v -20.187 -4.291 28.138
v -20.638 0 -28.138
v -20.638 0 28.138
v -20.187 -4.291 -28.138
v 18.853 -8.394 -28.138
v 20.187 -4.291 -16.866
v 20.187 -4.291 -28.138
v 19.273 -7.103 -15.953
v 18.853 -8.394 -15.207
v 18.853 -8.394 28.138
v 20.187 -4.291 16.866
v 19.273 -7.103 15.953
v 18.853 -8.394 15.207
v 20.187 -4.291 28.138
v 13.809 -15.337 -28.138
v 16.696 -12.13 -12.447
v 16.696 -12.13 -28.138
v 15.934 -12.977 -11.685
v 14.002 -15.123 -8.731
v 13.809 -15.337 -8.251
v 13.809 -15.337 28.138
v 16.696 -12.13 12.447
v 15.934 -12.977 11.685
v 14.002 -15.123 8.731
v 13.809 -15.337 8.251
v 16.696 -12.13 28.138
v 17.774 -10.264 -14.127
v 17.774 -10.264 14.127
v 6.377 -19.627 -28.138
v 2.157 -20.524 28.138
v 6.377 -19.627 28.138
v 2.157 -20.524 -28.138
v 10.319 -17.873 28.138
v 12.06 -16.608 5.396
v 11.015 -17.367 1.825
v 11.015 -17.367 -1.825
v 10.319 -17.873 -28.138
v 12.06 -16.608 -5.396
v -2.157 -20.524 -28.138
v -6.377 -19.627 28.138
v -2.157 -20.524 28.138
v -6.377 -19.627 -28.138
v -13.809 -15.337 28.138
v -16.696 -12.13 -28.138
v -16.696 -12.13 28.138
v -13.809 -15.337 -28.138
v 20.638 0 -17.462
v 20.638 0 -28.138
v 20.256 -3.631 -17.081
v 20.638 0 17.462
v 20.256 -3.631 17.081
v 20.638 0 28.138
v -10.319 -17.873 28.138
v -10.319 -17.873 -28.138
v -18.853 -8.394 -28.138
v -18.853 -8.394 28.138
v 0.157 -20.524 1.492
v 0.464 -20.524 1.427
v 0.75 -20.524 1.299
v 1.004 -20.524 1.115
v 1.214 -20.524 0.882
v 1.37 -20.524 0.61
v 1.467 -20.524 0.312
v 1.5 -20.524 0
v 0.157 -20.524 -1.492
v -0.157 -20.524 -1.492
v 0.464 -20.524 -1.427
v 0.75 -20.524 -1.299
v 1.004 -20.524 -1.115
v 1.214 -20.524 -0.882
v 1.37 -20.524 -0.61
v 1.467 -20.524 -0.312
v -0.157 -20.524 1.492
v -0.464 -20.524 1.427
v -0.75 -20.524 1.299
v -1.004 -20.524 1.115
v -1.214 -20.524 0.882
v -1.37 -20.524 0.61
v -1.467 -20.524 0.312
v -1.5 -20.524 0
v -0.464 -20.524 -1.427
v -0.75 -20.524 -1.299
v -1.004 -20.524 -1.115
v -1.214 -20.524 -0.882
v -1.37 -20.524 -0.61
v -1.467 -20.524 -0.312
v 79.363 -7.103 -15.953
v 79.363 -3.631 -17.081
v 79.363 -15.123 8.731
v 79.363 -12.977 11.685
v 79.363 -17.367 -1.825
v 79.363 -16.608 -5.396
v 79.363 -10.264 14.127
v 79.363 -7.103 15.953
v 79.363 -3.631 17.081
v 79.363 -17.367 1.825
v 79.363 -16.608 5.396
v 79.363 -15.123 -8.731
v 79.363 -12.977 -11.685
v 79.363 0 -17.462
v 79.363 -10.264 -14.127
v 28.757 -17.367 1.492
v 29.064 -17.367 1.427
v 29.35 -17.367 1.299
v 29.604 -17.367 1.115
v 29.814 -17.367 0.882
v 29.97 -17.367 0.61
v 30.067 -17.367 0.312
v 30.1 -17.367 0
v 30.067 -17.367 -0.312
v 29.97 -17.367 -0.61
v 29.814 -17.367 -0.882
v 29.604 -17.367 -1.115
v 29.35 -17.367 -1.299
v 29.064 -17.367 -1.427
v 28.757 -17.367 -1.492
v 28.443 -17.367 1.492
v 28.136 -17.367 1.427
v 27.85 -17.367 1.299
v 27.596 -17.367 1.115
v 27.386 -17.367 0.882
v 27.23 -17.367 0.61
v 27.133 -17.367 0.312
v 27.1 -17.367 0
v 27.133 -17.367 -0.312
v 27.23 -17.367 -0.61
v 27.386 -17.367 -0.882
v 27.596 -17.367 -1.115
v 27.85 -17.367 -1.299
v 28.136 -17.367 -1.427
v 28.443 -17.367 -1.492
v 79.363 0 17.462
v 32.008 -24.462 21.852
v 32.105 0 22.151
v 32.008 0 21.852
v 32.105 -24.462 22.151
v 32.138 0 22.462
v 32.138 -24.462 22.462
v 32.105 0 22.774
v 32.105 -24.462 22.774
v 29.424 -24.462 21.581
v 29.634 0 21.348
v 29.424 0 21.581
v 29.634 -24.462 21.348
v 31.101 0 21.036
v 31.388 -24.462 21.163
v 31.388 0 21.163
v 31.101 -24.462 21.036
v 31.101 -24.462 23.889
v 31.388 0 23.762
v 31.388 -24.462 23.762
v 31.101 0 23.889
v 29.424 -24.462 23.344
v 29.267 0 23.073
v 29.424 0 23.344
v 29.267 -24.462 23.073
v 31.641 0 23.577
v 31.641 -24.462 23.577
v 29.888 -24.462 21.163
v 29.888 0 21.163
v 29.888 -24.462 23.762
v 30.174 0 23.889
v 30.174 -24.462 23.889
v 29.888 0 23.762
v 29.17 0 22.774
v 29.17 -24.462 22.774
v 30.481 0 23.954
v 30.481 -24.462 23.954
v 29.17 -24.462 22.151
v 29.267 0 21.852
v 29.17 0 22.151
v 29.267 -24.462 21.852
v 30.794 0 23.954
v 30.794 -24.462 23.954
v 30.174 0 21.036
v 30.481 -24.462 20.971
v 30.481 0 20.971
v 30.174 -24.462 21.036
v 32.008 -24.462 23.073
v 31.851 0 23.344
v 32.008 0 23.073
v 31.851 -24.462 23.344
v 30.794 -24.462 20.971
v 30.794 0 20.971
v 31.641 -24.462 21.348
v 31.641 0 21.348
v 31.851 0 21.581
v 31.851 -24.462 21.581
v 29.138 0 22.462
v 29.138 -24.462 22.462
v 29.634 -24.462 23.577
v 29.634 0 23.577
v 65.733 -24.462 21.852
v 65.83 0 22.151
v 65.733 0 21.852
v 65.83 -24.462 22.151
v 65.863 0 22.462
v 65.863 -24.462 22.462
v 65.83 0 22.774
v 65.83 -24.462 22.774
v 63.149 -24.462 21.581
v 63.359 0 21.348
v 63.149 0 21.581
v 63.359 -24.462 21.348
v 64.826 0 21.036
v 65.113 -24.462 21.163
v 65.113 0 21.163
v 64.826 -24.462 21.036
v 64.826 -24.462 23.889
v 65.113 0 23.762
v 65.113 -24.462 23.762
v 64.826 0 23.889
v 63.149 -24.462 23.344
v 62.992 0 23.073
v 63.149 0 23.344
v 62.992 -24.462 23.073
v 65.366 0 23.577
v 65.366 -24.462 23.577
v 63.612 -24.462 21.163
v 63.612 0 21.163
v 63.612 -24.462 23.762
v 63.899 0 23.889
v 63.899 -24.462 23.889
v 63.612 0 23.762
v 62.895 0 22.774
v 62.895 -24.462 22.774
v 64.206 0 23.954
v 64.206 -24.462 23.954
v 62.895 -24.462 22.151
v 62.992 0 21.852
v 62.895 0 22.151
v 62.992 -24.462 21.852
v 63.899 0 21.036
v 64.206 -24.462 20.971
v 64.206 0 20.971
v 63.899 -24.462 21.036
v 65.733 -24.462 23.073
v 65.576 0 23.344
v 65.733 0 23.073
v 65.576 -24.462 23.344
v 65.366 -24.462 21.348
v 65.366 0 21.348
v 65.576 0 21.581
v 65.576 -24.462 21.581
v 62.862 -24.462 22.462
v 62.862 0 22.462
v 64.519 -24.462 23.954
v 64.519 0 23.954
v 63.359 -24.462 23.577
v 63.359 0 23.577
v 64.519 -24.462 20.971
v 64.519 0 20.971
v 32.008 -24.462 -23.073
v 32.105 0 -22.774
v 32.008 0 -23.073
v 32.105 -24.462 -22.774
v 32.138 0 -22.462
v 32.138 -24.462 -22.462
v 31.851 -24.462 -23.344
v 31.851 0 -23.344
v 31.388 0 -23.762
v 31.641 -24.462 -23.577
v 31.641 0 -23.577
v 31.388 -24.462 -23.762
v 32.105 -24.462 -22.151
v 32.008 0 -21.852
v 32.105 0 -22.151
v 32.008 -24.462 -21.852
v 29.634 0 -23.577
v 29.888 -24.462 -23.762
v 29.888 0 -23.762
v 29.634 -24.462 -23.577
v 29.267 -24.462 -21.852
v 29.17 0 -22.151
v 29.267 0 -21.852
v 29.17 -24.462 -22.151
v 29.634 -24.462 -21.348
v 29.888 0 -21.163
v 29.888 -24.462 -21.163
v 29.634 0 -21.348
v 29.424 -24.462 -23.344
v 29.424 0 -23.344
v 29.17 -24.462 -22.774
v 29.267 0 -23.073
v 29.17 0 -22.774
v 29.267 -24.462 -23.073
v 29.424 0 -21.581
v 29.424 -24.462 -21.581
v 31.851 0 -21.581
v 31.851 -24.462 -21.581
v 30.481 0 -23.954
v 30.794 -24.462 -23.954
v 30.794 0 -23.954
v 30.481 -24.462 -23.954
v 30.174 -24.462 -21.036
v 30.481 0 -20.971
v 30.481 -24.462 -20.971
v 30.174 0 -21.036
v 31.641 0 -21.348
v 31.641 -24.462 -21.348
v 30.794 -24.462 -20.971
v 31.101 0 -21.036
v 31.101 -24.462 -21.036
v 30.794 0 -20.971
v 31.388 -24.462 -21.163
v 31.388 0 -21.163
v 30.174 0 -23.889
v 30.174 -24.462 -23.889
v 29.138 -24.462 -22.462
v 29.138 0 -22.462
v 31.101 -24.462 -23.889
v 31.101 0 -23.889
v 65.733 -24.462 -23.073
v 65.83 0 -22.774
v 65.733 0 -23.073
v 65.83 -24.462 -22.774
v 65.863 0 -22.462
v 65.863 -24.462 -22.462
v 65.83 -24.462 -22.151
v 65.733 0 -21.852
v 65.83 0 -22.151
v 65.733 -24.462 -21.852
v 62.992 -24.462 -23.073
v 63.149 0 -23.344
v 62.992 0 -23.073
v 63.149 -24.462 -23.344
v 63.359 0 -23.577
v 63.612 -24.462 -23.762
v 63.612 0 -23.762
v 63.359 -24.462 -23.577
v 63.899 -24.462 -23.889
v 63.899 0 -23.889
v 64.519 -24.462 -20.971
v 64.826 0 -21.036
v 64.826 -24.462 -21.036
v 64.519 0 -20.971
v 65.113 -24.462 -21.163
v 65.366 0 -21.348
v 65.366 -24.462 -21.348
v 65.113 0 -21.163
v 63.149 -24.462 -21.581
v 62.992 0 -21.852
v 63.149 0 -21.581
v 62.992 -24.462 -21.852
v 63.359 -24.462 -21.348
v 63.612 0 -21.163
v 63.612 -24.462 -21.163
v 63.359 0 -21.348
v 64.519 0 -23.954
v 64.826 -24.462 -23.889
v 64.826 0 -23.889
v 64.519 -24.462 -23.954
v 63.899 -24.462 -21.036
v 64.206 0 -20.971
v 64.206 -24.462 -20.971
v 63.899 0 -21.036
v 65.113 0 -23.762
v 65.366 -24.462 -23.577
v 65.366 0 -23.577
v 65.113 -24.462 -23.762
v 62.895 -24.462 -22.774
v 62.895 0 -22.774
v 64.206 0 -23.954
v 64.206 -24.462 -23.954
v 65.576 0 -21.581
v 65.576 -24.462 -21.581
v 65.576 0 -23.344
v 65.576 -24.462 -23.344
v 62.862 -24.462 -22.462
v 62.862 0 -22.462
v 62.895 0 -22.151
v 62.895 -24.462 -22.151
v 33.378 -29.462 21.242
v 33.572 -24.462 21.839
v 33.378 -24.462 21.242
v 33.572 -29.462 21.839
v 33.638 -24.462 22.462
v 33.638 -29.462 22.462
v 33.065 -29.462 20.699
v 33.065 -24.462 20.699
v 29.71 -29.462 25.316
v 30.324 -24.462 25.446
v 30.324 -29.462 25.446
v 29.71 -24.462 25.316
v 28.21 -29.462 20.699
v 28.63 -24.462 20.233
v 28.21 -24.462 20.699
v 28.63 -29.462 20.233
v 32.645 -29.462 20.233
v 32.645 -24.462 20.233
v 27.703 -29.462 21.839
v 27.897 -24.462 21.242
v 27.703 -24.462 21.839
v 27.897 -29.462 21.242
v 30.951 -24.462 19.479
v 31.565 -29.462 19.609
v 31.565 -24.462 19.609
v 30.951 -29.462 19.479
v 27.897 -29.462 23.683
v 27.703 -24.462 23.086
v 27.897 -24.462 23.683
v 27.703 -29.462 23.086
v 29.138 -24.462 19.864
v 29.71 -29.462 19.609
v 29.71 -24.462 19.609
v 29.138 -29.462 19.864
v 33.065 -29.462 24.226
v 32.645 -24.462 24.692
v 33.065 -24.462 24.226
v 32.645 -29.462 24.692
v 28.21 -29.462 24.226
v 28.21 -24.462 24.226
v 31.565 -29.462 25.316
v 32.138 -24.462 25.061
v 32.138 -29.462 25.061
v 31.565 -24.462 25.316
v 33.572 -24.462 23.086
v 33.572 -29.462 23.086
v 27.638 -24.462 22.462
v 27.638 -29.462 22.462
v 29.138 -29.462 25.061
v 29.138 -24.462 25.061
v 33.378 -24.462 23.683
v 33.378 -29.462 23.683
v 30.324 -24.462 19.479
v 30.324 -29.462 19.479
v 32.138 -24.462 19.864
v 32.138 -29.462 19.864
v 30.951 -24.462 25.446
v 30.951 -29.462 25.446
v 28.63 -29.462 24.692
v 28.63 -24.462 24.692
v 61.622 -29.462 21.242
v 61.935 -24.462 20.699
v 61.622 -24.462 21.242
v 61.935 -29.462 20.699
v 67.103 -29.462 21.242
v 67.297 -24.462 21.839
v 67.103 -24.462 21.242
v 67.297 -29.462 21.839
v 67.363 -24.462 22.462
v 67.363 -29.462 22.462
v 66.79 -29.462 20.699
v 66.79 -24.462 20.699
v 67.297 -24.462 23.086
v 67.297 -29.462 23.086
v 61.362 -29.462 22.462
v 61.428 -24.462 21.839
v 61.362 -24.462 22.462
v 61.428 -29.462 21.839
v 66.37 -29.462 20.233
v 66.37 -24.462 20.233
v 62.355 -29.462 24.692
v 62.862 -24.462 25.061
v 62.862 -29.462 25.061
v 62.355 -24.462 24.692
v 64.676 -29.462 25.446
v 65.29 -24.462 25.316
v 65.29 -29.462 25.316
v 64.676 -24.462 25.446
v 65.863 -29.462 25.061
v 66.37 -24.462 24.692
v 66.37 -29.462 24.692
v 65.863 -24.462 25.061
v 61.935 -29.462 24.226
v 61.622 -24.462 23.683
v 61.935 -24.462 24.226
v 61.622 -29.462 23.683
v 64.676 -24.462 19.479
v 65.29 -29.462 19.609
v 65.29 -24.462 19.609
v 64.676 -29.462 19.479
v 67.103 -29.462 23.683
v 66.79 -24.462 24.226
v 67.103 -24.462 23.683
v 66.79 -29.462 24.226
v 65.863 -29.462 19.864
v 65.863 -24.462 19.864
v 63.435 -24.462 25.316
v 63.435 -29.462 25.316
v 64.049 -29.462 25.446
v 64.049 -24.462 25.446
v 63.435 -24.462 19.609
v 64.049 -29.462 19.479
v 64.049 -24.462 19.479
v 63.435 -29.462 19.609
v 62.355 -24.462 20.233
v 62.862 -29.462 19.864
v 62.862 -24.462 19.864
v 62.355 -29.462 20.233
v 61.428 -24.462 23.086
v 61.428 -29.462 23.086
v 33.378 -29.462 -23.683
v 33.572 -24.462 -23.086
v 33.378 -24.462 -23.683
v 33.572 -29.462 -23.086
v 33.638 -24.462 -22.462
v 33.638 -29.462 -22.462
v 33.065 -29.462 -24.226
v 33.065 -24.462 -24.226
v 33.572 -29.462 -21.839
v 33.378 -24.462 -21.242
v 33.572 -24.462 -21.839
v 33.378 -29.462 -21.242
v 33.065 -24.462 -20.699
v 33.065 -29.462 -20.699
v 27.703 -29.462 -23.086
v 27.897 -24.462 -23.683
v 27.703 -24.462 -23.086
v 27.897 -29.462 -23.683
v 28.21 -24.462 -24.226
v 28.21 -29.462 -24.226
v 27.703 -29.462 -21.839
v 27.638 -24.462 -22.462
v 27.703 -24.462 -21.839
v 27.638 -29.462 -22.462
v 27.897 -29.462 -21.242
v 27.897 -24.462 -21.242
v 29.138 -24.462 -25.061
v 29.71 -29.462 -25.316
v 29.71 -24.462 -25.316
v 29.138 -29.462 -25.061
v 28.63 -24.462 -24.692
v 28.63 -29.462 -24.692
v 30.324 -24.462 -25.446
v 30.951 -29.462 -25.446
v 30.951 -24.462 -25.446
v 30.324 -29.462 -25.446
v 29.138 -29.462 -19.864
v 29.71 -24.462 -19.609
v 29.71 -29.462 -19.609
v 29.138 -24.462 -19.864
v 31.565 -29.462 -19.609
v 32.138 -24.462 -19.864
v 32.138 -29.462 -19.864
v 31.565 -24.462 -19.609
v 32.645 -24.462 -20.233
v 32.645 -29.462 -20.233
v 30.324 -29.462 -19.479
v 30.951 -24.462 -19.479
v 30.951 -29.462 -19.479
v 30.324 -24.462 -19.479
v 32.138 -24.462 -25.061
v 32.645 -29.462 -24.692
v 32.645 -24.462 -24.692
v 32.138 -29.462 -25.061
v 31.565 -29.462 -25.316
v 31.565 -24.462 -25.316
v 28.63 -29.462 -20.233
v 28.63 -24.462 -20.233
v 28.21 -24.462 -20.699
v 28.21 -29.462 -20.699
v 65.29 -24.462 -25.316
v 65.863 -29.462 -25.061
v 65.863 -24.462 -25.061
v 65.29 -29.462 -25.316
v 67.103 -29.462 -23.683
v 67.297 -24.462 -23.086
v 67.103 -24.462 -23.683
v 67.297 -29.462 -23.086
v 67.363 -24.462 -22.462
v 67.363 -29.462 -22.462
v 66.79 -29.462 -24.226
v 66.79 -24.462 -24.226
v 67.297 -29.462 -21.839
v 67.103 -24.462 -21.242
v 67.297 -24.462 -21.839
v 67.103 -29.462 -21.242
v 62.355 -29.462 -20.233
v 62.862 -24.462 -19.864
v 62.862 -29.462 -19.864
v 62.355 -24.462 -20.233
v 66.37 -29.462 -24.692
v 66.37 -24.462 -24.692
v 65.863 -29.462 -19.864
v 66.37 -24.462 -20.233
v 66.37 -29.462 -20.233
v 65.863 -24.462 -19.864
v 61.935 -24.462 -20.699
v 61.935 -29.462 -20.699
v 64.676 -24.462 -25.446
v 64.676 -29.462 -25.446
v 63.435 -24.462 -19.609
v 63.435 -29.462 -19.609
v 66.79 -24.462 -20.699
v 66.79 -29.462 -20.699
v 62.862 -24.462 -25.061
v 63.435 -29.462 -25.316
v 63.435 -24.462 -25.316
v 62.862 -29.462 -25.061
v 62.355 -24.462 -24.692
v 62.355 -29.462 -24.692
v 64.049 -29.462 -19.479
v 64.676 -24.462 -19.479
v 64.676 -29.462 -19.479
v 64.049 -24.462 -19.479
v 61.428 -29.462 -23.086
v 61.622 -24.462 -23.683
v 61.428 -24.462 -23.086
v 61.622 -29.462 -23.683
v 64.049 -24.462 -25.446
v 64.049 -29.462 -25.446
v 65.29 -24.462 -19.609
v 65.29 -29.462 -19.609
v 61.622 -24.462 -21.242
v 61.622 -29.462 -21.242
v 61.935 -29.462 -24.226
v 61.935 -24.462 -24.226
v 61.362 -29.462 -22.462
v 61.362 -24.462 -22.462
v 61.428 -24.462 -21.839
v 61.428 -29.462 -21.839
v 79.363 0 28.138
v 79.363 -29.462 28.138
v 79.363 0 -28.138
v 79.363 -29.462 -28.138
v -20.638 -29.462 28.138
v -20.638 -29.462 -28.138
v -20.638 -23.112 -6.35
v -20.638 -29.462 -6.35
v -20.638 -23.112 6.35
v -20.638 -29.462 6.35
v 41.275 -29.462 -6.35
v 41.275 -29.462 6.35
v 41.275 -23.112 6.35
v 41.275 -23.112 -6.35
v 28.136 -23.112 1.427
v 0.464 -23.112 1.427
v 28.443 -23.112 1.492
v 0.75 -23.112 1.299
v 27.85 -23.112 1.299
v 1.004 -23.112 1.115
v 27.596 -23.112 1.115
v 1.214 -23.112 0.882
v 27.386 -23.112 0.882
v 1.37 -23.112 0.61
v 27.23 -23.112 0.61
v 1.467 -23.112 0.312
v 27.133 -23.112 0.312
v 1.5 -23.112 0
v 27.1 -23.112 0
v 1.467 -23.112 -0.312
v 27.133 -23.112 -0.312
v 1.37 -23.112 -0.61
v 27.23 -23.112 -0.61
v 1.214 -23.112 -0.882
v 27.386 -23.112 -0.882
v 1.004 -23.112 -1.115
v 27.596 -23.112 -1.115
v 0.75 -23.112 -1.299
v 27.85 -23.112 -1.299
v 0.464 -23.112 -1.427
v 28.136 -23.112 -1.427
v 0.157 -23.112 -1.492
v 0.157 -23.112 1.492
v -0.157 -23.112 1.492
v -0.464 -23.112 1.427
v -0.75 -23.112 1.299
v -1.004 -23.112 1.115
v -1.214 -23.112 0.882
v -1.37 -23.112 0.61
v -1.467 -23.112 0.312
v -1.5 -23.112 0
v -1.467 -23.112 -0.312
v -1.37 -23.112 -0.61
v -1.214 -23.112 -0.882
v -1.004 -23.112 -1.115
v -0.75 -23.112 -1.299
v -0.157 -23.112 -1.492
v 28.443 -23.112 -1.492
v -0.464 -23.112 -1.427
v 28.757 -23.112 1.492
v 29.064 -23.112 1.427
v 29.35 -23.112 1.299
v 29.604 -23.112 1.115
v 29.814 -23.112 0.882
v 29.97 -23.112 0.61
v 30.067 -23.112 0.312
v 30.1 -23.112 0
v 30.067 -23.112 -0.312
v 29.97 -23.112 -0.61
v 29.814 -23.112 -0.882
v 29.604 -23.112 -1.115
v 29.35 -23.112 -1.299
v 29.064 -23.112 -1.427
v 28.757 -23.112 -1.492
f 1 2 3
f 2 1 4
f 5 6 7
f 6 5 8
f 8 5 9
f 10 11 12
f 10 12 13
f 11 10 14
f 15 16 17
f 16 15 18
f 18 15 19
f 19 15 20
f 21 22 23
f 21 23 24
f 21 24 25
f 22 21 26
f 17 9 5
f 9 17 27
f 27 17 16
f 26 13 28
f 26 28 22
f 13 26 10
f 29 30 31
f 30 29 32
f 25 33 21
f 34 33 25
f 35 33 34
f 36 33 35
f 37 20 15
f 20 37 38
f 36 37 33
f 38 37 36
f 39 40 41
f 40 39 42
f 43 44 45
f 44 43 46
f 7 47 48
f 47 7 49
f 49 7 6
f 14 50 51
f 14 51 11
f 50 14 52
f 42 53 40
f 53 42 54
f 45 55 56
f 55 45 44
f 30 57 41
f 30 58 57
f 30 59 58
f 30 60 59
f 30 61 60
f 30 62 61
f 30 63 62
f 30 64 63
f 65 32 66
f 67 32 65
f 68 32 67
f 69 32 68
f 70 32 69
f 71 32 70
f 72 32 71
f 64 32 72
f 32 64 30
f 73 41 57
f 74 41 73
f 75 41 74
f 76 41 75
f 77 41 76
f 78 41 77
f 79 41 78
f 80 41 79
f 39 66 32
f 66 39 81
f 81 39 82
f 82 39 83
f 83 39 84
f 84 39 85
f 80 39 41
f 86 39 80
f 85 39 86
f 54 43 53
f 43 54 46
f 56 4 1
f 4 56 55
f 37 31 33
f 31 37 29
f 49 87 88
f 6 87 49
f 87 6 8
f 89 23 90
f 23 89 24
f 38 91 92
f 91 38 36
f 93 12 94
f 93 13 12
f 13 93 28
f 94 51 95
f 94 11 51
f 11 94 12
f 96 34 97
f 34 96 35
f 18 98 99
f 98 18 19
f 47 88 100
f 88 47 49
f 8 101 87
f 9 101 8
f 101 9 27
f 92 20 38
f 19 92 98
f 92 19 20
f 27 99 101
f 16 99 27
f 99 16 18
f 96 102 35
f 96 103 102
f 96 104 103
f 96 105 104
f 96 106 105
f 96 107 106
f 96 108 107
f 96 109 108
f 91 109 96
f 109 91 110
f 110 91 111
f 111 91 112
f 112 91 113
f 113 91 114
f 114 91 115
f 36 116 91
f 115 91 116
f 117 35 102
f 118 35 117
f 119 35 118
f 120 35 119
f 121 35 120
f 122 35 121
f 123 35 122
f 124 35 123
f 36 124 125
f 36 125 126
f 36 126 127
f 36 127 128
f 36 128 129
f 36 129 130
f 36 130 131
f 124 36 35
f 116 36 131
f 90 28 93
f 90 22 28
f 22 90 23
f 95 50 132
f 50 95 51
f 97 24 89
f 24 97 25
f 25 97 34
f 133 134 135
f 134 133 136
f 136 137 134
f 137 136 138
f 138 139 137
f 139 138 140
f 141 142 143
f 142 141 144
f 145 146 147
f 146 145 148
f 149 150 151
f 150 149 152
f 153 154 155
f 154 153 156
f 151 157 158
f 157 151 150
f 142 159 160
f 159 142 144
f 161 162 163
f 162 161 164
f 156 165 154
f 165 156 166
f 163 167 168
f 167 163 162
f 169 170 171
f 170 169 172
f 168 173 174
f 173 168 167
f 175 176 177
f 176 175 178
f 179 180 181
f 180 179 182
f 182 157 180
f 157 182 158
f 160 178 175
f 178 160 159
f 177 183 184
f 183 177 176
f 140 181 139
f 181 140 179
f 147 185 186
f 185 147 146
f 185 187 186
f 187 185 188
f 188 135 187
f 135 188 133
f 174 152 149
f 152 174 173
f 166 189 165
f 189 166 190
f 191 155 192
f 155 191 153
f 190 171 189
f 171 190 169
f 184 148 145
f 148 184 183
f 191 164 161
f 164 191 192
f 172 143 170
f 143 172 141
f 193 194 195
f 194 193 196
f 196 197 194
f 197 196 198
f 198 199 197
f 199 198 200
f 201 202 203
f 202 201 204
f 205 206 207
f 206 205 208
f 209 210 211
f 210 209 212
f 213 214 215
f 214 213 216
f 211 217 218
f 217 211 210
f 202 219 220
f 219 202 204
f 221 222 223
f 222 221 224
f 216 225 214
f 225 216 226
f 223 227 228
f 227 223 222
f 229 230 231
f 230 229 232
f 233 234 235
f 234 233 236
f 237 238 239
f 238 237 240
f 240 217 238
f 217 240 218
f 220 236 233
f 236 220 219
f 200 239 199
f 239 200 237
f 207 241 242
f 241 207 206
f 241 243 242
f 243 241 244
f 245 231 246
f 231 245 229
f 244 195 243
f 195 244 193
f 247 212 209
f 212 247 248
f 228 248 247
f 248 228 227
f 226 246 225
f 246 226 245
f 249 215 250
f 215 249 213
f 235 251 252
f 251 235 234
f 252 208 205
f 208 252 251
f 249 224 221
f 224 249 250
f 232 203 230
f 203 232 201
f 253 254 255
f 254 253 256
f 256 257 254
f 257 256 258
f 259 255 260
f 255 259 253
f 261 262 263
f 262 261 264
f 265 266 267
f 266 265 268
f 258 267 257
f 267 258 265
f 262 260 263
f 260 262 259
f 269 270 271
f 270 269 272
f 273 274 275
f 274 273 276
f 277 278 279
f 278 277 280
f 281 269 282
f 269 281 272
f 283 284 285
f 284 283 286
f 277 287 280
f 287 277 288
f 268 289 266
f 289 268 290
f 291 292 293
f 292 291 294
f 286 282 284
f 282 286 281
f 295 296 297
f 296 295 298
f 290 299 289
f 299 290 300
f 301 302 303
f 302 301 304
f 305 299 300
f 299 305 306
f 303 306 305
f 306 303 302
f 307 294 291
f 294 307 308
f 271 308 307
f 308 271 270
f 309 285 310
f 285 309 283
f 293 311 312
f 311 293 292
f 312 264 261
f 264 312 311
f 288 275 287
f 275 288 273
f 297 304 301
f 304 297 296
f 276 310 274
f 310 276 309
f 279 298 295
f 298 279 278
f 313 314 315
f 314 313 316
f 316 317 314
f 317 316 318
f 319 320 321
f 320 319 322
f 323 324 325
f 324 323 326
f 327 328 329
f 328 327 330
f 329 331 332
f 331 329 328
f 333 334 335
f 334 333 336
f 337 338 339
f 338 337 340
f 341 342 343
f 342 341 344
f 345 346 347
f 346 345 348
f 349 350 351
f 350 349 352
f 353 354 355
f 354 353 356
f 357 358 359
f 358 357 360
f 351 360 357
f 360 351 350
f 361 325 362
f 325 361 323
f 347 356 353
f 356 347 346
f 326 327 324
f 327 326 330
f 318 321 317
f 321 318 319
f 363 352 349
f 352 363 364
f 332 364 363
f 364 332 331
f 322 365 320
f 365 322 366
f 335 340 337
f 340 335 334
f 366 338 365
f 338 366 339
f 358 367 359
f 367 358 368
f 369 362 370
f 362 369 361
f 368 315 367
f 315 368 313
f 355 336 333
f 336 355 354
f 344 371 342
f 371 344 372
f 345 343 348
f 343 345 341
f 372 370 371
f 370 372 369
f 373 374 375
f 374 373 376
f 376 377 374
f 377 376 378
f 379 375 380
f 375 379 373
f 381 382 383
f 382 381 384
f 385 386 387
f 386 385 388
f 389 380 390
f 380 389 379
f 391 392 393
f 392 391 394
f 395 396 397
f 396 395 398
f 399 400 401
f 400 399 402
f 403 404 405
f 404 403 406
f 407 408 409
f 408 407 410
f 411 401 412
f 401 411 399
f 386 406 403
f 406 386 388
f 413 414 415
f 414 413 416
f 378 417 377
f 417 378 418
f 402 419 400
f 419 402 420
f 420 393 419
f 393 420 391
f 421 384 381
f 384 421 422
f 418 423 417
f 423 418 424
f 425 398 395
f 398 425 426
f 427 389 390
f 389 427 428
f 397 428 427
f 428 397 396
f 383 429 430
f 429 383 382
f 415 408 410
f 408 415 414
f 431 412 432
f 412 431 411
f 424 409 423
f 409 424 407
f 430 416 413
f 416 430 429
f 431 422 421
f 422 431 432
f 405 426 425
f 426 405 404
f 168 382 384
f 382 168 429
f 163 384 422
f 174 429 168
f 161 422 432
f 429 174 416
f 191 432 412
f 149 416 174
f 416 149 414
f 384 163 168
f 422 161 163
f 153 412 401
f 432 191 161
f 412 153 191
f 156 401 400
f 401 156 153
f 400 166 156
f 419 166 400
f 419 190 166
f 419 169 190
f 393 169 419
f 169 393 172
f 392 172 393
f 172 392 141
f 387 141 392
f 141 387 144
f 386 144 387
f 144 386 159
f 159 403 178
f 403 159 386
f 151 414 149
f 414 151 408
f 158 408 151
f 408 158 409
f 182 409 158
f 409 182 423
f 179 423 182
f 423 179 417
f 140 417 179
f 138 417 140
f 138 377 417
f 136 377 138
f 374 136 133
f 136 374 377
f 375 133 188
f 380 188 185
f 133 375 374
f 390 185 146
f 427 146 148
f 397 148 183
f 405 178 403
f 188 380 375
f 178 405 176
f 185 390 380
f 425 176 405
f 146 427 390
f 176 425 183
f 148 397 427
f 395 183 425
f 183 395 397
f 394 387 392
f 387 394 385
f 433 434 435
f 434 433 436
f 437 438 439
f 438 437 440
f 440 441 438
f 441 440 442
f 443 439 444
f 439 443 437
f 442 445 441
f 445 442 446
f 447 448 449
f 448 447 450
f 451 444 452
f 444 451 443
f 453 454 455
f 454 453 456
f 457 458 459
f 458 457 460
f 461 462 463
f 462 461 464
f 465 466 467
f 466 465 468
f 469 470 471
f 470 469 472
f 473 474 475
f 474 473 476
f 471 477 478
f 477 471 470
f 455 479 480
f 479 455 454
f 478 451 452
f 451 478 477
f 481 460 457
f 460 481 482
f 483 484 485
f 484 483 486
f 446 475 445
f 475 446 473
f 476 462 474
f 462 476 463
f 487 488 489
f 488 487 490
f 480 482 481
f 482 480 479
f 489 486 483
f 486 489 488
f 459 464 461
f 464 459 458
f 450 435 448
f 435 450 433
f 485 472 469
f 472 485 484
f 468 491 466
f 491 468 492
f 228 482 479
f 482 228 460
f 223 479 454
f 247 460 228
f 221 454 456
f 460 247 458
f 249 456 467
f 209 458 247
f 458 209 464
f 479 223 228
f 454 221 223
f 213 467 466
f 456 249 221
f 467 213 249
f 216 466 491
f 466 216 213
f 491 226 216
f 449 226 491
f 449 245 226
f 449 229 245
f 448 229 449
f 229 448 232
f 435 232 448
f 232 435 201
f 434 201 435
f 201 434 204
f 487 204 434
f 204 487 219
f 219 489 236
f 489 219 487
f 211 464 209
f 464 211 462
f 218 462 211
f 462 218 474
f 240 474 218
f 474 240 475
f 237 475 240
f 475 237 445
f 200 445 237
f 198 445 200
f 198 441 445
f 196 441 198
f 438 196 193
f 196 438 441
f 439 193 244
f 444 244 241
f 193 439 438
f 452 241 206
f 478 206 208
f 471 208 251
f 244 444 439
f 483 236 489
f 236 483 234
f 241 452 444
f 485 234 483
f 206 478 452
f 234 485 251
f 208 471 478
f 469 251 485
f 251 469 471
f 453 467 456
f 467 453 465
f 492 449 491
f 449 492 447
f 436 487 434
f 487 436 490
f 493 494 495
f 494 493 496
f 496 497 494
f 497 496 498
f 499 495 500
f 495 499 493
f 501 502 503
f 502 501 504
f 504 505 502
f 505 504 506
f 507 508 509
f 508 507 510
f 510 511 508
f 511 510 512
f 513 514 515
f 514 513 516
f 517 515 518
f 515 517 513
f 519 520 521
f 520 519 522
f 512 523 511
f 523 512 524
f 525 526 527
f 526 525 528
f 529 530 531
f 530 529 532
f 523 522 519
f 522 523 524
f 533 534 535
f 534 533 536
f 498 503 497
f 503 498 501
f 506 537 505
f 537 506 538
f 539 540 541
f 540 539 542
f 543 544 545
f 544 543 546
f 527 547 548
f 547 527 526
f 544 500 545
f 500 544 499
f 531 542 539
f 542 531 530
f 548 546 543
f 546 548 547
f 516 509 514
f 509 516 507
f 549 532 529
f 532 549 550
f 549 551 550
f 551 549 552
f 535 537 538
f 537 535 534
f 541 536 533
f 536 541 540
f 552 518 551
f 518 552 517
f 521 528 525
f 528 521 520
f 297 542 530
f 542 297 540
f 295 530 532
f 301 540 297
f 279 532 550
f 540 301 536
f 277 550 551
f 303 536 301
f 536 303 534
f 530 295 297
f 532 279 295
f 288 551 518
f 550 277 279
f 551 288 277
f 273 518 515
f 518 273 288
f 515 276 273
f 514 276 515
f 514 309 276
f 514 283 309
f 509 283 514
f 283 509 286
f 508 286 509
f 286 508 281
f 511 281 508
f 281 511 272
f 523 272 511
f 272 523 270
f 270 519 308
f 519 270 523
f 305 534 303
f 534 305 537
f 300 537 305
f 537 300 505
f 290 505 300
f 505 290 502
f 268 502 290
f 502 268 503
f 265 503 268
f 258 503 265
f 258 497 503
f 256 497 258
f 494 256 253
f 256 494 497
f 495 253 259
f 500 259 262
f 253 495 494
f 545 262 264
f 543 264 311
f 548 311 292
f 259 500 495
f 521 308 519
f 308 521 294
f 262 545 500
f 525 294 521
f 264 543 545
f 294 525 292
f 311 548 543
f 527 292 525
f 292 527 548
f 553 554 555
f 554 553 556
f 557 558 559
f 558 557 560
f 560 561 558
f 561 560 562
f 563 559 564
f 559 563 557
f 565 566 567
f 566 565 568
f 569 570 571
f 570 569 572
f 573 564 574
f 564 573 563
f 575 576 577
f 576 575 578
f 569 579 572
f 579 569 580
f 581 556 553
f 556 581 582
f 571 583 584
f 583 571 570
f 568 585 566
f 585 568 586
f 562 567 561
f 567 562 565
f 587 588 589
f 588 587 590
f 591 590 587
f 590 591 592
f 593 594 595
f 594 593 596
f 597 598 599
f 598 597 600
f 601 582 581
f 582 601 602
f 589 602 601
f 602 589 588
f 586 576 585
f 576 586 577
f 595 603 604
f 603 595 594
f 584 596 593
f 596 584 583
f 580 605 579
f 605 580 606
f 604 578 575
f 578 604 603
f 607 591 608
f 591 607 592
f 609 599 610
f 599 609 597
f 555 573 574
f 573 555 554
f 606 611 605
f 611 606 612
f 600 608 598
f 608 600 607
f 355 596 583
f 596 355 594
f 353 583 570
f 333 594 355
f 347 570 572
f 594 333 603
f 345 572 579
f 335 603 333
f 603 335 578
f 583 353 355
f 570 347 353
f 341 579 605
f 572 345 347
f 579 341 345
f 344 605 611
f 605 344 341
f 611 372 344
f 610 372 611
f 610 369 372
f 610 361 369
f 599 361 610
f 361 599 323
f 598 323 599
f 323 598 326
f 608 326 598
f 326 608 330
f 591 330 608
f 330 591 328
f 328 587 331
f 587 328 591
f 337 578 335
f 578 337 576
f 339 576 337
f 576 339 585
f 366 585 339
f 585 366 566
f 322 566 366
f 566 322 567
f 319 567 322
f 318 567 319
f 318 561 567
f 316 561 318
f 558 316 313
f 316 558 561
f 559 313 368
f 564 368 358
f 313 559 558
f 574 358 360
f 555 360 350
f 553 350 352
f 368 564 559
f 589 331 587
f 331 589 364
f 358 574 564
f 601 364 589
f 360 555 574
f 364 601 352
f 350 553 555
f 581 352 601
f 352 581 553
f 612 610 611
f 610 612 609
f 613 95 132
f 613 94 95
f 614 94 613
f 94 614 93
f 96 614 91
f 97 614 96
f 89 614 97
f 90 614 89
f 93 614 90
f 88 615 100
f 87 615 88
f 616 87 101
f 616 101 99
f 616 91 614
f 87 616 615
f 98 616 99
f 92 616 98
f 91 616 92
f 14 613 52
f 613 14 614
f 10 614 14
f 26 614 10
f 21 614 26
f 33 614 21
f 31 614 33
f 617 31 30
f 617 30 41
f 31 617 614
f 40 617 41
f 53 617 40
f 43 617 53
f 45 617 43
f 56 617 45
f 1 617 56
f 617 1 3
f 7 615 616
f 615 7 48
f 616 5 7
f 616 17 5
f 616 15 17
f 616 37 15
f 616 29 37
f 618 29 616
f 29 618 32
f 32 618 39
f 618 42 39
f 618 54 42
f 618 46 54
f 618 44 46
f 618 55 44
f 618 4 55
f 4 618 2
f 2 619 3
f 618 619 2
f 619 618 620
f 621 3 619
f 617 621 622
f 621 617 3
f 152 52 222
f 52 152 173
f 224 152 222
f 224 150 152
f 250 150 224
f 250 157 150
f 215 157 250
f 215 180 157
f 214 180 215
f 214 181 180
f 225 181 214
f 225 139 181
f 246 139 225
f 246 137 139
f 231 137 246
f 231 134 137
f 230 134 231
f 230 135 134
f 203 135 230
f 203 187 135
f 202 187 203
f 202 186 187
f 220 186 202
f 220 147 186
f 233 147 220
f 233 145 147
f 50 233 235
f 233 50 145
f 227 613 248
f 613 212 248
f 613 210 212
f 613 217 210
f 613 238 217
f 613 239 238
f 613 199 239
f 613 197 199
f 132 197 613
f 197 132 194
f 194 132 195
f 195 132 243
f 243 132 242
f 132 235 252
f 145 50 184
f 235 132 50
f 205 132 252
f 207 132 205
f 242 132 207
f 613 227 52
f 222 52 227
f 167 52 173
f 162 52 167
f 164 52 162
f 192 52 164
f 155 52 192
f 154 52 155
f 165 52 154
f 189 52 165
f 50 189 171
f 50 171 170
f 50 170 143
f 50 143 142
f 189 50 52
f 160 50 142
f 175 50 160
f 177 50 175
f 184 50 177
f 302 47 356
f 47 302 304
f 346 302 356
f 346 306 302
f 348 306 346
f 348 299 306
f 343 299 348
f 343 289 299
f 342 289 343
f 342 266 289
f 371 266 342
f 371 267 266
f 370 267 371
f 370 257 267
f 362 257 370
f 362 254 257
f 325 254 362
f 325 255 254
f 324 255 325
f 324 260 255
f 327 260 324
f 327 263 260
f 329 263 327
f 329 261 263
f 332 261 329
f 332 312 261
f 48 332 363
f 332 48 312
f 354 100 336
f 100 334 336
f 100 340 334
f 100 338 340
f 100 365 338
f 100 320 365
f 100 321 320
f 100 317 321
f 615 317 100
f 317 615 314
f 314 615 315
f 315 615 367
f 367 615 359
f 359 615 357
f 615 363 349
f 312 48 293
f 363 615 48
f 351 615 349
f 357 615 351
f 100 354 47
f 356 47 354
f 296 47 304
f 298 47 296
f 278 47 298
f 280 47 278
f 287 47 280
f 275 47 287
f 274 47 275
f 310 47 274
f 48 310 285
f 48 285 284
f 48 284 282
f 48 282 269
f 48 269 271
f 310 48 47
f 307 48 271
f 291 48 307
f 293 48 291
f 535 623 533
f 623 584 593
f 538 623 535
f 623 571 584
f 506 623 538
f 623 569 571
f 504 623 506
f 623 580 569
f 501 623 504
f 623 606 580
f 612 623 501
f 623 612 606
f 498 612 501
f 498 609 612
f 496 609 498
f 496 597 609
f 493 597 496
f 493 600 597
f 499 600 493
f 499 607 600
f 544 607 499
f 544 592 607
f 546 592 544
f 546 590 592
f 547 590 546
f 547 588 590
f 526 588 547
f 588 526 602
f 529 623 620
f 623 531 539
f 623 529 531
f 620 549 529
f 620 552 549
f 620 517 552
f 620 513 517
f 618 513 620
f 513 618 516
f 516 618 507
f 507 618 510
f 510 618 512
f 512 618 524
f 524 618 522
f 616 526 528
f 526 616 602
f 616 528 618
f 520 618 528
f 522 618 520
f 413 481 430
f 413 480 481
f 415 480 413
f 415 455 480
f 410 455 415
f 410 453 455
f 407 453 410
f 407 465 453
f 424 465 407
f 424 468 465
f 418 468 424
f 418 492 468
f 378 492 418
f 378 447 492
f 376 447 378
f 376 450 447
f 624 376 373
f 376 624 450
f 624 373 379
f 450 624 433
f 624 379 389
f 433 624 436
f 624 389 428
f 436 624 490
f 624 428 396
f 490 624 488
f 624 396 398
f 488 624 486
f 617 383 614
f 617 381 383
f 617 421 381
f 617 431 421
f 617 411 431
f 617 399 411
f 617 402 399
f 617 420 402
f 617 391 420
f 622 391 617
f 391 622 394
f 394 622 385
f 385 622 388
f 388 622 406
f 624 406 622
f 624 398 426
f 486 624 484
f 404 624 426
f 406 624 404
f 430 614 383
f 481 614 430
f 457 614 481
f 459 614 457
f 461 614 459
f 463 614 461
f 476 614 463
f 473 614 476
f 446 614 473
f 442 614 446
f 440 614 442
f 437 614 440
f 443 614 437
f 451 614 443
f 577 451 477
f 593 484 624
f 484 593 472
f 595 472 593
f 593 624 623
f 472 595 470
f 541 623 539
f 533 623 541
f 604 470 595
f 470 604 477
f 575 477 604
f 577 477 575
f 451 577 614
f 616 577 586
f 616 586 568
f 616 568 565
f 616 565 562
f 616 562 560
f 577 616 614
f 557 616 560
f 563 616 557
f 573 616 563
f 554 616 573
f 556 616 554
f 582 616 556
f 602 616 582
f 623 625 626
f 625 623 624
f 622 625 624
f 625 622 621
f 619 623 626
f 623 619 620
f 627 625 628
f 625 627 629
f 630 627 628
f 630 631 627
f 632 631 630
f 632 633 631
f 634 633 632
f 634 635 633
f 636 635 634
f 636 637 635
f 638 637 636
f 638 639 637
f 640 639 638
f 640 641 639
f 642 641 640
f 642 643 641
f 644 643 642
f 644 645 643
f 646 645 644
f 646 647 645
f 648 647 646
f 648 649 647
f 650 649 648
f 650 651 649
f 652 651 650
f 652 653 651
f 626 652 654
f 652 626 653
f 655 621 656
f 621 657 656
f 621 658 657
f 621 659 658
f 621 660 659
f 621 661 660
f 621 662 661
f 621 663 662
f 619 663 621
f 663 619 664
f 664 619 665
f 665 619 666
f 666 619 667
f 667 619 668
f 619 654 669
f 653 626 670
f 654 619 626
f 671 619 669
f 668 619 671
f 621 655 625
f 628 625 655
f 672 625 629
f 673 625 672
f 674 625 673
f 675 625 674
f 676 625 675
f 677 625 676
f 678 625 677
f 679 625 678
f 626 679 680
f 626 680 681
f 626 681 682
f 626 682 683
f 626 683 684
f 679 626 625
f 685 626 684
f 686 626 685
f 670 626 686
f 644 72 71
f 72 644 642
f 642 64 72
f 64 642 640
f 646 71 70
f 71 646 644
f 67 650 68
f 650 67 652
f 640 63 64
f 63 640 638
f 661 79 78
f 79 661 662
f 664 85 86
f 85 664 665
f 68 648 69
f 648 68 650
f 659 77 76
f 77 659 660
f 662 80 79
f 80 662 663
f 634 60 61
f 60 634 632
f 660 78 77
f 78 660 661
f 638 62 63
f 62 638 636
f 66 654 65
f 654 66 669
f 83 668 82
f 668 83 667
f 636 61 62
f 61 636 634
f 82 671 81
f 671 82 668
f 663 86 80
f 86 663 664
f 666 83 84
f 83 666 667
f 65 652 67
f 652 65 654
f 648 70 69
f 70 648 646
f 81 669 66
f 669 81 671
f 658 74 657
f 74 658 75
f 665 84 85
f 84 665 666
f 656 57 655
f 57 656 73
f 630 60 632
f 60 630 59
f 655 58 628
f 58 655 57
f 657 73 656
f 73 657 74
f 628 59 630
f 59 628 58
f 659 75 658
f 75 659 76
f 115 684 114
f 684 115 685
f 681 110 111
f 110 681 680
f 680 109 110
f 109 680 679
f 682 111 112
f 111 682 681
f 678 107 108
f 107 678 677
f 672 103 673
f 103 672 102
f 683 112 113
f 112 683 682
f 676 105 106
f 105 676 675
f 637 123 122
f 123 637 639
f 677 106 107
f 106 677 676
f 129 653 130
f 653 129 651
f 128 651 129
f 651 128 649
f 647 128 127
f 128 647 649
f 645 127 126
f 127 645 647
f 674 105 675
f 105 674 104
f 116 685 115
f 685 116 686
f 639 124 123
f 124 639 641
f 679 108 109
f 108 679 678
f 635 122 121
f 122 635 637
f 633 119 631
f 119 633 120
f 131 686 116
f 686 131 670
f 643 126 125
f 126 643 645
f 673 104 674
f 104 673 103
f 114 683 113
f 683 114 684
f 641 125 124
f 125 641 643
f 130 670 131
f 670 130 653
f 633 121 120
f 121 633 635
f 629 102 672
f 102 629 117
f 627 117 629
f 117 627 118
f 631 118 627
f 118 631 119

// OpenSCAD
tube_lg_diam = 41.275;
tube_sm_diam = 34.925;
tube_lg_rad = tube_lg_diam / 2;
tube_sm_rad = tube_sm_diam / 2;

module tubes() {
 color("green") {
  translate([0,0,-100]) cylinder(r=tube_lg_rad, h=200);
  rotate([0,90,0]) cylinder(r=tube_sm_rad, h=200);
 }
}

bracket_width = 100;
bracket_height = tube_lg_diam + 15;
bracket_depth = tube_sm_rad + 12;
back_bracket_width = bracket_width;
back_bracket_height = bracket_height;
back_bracket_depth = tube_lg_rad + 5;


latch_width = 1.5 * tube_lg_diam;
latch_height = 12.7;
latch_depth = 6.35;

sh_rad = 1.5;
module screw_hole(rad, depth) {
 translate([0,-50,0])
  rotate([-90,0,0])
   cylinder(r=rad, h=depth, $fn=30);
}

module screw_holes(rad, depth) {
  translate([tube_lg_rad + 10, 0, tube_sm_rad + 5])
   #screw_hole(rad, depth);
  translate([bracket_width - tube_lg_rad - 15, 0, tube_sm_rad + 5])
   #screw_hole(rad, depth);
  translate([tube_lg_rad + 10, 0, -1 * (tube_sm_rad + 5)])
   #screw_hole(rad, depth);
  translate([bracket_width - tube_lg_rad - 15, 0, -1 * (tube_sm_rad + 5)])
   #screw_hole(rad, depth);
}

module bracket(wid, ht, dep) {
 difference() {
  translate([-1 * tube_lg_rad,-1 * dep,-0.5 * ht])
   cube(size=[wid,dep,ht]);
  #tubes();
  #screw_holes(sh_rad, 51);
  #screw_holes(sh_rad * 2, 50-dep+5);
 }
}

hole_dist = 28.6;

module front() {
 difference() {
  bracket(bracket_width, bracket_height, bracket_depth);
  #translate([-1*tube_lg_rad, -1*bracket_depth, -0.5 * latch_height]) cube(size=[latch_width, latch_depth,latch_height]);
  #screw_hole(sh_rad, 51);
  translate([hole_dist,0,0]) screw_hole(sh_rad, 51);
 }
}

module back() {
 difference() {
  bracket(back_bracket_width, back_bracket_height, back_bracket_depth);
  #translate([-1*tube_lg_rad-1,-1*tube_lg_diam-1,-0.5*back_bracket_height-1]) cube(size=[tube_lg_diam+2,tube_lg_diam+2,back_bracket_height+2]);
 }
}

//screw_hole();
front();
// back:
//rotate([180,0,0])
//back();
